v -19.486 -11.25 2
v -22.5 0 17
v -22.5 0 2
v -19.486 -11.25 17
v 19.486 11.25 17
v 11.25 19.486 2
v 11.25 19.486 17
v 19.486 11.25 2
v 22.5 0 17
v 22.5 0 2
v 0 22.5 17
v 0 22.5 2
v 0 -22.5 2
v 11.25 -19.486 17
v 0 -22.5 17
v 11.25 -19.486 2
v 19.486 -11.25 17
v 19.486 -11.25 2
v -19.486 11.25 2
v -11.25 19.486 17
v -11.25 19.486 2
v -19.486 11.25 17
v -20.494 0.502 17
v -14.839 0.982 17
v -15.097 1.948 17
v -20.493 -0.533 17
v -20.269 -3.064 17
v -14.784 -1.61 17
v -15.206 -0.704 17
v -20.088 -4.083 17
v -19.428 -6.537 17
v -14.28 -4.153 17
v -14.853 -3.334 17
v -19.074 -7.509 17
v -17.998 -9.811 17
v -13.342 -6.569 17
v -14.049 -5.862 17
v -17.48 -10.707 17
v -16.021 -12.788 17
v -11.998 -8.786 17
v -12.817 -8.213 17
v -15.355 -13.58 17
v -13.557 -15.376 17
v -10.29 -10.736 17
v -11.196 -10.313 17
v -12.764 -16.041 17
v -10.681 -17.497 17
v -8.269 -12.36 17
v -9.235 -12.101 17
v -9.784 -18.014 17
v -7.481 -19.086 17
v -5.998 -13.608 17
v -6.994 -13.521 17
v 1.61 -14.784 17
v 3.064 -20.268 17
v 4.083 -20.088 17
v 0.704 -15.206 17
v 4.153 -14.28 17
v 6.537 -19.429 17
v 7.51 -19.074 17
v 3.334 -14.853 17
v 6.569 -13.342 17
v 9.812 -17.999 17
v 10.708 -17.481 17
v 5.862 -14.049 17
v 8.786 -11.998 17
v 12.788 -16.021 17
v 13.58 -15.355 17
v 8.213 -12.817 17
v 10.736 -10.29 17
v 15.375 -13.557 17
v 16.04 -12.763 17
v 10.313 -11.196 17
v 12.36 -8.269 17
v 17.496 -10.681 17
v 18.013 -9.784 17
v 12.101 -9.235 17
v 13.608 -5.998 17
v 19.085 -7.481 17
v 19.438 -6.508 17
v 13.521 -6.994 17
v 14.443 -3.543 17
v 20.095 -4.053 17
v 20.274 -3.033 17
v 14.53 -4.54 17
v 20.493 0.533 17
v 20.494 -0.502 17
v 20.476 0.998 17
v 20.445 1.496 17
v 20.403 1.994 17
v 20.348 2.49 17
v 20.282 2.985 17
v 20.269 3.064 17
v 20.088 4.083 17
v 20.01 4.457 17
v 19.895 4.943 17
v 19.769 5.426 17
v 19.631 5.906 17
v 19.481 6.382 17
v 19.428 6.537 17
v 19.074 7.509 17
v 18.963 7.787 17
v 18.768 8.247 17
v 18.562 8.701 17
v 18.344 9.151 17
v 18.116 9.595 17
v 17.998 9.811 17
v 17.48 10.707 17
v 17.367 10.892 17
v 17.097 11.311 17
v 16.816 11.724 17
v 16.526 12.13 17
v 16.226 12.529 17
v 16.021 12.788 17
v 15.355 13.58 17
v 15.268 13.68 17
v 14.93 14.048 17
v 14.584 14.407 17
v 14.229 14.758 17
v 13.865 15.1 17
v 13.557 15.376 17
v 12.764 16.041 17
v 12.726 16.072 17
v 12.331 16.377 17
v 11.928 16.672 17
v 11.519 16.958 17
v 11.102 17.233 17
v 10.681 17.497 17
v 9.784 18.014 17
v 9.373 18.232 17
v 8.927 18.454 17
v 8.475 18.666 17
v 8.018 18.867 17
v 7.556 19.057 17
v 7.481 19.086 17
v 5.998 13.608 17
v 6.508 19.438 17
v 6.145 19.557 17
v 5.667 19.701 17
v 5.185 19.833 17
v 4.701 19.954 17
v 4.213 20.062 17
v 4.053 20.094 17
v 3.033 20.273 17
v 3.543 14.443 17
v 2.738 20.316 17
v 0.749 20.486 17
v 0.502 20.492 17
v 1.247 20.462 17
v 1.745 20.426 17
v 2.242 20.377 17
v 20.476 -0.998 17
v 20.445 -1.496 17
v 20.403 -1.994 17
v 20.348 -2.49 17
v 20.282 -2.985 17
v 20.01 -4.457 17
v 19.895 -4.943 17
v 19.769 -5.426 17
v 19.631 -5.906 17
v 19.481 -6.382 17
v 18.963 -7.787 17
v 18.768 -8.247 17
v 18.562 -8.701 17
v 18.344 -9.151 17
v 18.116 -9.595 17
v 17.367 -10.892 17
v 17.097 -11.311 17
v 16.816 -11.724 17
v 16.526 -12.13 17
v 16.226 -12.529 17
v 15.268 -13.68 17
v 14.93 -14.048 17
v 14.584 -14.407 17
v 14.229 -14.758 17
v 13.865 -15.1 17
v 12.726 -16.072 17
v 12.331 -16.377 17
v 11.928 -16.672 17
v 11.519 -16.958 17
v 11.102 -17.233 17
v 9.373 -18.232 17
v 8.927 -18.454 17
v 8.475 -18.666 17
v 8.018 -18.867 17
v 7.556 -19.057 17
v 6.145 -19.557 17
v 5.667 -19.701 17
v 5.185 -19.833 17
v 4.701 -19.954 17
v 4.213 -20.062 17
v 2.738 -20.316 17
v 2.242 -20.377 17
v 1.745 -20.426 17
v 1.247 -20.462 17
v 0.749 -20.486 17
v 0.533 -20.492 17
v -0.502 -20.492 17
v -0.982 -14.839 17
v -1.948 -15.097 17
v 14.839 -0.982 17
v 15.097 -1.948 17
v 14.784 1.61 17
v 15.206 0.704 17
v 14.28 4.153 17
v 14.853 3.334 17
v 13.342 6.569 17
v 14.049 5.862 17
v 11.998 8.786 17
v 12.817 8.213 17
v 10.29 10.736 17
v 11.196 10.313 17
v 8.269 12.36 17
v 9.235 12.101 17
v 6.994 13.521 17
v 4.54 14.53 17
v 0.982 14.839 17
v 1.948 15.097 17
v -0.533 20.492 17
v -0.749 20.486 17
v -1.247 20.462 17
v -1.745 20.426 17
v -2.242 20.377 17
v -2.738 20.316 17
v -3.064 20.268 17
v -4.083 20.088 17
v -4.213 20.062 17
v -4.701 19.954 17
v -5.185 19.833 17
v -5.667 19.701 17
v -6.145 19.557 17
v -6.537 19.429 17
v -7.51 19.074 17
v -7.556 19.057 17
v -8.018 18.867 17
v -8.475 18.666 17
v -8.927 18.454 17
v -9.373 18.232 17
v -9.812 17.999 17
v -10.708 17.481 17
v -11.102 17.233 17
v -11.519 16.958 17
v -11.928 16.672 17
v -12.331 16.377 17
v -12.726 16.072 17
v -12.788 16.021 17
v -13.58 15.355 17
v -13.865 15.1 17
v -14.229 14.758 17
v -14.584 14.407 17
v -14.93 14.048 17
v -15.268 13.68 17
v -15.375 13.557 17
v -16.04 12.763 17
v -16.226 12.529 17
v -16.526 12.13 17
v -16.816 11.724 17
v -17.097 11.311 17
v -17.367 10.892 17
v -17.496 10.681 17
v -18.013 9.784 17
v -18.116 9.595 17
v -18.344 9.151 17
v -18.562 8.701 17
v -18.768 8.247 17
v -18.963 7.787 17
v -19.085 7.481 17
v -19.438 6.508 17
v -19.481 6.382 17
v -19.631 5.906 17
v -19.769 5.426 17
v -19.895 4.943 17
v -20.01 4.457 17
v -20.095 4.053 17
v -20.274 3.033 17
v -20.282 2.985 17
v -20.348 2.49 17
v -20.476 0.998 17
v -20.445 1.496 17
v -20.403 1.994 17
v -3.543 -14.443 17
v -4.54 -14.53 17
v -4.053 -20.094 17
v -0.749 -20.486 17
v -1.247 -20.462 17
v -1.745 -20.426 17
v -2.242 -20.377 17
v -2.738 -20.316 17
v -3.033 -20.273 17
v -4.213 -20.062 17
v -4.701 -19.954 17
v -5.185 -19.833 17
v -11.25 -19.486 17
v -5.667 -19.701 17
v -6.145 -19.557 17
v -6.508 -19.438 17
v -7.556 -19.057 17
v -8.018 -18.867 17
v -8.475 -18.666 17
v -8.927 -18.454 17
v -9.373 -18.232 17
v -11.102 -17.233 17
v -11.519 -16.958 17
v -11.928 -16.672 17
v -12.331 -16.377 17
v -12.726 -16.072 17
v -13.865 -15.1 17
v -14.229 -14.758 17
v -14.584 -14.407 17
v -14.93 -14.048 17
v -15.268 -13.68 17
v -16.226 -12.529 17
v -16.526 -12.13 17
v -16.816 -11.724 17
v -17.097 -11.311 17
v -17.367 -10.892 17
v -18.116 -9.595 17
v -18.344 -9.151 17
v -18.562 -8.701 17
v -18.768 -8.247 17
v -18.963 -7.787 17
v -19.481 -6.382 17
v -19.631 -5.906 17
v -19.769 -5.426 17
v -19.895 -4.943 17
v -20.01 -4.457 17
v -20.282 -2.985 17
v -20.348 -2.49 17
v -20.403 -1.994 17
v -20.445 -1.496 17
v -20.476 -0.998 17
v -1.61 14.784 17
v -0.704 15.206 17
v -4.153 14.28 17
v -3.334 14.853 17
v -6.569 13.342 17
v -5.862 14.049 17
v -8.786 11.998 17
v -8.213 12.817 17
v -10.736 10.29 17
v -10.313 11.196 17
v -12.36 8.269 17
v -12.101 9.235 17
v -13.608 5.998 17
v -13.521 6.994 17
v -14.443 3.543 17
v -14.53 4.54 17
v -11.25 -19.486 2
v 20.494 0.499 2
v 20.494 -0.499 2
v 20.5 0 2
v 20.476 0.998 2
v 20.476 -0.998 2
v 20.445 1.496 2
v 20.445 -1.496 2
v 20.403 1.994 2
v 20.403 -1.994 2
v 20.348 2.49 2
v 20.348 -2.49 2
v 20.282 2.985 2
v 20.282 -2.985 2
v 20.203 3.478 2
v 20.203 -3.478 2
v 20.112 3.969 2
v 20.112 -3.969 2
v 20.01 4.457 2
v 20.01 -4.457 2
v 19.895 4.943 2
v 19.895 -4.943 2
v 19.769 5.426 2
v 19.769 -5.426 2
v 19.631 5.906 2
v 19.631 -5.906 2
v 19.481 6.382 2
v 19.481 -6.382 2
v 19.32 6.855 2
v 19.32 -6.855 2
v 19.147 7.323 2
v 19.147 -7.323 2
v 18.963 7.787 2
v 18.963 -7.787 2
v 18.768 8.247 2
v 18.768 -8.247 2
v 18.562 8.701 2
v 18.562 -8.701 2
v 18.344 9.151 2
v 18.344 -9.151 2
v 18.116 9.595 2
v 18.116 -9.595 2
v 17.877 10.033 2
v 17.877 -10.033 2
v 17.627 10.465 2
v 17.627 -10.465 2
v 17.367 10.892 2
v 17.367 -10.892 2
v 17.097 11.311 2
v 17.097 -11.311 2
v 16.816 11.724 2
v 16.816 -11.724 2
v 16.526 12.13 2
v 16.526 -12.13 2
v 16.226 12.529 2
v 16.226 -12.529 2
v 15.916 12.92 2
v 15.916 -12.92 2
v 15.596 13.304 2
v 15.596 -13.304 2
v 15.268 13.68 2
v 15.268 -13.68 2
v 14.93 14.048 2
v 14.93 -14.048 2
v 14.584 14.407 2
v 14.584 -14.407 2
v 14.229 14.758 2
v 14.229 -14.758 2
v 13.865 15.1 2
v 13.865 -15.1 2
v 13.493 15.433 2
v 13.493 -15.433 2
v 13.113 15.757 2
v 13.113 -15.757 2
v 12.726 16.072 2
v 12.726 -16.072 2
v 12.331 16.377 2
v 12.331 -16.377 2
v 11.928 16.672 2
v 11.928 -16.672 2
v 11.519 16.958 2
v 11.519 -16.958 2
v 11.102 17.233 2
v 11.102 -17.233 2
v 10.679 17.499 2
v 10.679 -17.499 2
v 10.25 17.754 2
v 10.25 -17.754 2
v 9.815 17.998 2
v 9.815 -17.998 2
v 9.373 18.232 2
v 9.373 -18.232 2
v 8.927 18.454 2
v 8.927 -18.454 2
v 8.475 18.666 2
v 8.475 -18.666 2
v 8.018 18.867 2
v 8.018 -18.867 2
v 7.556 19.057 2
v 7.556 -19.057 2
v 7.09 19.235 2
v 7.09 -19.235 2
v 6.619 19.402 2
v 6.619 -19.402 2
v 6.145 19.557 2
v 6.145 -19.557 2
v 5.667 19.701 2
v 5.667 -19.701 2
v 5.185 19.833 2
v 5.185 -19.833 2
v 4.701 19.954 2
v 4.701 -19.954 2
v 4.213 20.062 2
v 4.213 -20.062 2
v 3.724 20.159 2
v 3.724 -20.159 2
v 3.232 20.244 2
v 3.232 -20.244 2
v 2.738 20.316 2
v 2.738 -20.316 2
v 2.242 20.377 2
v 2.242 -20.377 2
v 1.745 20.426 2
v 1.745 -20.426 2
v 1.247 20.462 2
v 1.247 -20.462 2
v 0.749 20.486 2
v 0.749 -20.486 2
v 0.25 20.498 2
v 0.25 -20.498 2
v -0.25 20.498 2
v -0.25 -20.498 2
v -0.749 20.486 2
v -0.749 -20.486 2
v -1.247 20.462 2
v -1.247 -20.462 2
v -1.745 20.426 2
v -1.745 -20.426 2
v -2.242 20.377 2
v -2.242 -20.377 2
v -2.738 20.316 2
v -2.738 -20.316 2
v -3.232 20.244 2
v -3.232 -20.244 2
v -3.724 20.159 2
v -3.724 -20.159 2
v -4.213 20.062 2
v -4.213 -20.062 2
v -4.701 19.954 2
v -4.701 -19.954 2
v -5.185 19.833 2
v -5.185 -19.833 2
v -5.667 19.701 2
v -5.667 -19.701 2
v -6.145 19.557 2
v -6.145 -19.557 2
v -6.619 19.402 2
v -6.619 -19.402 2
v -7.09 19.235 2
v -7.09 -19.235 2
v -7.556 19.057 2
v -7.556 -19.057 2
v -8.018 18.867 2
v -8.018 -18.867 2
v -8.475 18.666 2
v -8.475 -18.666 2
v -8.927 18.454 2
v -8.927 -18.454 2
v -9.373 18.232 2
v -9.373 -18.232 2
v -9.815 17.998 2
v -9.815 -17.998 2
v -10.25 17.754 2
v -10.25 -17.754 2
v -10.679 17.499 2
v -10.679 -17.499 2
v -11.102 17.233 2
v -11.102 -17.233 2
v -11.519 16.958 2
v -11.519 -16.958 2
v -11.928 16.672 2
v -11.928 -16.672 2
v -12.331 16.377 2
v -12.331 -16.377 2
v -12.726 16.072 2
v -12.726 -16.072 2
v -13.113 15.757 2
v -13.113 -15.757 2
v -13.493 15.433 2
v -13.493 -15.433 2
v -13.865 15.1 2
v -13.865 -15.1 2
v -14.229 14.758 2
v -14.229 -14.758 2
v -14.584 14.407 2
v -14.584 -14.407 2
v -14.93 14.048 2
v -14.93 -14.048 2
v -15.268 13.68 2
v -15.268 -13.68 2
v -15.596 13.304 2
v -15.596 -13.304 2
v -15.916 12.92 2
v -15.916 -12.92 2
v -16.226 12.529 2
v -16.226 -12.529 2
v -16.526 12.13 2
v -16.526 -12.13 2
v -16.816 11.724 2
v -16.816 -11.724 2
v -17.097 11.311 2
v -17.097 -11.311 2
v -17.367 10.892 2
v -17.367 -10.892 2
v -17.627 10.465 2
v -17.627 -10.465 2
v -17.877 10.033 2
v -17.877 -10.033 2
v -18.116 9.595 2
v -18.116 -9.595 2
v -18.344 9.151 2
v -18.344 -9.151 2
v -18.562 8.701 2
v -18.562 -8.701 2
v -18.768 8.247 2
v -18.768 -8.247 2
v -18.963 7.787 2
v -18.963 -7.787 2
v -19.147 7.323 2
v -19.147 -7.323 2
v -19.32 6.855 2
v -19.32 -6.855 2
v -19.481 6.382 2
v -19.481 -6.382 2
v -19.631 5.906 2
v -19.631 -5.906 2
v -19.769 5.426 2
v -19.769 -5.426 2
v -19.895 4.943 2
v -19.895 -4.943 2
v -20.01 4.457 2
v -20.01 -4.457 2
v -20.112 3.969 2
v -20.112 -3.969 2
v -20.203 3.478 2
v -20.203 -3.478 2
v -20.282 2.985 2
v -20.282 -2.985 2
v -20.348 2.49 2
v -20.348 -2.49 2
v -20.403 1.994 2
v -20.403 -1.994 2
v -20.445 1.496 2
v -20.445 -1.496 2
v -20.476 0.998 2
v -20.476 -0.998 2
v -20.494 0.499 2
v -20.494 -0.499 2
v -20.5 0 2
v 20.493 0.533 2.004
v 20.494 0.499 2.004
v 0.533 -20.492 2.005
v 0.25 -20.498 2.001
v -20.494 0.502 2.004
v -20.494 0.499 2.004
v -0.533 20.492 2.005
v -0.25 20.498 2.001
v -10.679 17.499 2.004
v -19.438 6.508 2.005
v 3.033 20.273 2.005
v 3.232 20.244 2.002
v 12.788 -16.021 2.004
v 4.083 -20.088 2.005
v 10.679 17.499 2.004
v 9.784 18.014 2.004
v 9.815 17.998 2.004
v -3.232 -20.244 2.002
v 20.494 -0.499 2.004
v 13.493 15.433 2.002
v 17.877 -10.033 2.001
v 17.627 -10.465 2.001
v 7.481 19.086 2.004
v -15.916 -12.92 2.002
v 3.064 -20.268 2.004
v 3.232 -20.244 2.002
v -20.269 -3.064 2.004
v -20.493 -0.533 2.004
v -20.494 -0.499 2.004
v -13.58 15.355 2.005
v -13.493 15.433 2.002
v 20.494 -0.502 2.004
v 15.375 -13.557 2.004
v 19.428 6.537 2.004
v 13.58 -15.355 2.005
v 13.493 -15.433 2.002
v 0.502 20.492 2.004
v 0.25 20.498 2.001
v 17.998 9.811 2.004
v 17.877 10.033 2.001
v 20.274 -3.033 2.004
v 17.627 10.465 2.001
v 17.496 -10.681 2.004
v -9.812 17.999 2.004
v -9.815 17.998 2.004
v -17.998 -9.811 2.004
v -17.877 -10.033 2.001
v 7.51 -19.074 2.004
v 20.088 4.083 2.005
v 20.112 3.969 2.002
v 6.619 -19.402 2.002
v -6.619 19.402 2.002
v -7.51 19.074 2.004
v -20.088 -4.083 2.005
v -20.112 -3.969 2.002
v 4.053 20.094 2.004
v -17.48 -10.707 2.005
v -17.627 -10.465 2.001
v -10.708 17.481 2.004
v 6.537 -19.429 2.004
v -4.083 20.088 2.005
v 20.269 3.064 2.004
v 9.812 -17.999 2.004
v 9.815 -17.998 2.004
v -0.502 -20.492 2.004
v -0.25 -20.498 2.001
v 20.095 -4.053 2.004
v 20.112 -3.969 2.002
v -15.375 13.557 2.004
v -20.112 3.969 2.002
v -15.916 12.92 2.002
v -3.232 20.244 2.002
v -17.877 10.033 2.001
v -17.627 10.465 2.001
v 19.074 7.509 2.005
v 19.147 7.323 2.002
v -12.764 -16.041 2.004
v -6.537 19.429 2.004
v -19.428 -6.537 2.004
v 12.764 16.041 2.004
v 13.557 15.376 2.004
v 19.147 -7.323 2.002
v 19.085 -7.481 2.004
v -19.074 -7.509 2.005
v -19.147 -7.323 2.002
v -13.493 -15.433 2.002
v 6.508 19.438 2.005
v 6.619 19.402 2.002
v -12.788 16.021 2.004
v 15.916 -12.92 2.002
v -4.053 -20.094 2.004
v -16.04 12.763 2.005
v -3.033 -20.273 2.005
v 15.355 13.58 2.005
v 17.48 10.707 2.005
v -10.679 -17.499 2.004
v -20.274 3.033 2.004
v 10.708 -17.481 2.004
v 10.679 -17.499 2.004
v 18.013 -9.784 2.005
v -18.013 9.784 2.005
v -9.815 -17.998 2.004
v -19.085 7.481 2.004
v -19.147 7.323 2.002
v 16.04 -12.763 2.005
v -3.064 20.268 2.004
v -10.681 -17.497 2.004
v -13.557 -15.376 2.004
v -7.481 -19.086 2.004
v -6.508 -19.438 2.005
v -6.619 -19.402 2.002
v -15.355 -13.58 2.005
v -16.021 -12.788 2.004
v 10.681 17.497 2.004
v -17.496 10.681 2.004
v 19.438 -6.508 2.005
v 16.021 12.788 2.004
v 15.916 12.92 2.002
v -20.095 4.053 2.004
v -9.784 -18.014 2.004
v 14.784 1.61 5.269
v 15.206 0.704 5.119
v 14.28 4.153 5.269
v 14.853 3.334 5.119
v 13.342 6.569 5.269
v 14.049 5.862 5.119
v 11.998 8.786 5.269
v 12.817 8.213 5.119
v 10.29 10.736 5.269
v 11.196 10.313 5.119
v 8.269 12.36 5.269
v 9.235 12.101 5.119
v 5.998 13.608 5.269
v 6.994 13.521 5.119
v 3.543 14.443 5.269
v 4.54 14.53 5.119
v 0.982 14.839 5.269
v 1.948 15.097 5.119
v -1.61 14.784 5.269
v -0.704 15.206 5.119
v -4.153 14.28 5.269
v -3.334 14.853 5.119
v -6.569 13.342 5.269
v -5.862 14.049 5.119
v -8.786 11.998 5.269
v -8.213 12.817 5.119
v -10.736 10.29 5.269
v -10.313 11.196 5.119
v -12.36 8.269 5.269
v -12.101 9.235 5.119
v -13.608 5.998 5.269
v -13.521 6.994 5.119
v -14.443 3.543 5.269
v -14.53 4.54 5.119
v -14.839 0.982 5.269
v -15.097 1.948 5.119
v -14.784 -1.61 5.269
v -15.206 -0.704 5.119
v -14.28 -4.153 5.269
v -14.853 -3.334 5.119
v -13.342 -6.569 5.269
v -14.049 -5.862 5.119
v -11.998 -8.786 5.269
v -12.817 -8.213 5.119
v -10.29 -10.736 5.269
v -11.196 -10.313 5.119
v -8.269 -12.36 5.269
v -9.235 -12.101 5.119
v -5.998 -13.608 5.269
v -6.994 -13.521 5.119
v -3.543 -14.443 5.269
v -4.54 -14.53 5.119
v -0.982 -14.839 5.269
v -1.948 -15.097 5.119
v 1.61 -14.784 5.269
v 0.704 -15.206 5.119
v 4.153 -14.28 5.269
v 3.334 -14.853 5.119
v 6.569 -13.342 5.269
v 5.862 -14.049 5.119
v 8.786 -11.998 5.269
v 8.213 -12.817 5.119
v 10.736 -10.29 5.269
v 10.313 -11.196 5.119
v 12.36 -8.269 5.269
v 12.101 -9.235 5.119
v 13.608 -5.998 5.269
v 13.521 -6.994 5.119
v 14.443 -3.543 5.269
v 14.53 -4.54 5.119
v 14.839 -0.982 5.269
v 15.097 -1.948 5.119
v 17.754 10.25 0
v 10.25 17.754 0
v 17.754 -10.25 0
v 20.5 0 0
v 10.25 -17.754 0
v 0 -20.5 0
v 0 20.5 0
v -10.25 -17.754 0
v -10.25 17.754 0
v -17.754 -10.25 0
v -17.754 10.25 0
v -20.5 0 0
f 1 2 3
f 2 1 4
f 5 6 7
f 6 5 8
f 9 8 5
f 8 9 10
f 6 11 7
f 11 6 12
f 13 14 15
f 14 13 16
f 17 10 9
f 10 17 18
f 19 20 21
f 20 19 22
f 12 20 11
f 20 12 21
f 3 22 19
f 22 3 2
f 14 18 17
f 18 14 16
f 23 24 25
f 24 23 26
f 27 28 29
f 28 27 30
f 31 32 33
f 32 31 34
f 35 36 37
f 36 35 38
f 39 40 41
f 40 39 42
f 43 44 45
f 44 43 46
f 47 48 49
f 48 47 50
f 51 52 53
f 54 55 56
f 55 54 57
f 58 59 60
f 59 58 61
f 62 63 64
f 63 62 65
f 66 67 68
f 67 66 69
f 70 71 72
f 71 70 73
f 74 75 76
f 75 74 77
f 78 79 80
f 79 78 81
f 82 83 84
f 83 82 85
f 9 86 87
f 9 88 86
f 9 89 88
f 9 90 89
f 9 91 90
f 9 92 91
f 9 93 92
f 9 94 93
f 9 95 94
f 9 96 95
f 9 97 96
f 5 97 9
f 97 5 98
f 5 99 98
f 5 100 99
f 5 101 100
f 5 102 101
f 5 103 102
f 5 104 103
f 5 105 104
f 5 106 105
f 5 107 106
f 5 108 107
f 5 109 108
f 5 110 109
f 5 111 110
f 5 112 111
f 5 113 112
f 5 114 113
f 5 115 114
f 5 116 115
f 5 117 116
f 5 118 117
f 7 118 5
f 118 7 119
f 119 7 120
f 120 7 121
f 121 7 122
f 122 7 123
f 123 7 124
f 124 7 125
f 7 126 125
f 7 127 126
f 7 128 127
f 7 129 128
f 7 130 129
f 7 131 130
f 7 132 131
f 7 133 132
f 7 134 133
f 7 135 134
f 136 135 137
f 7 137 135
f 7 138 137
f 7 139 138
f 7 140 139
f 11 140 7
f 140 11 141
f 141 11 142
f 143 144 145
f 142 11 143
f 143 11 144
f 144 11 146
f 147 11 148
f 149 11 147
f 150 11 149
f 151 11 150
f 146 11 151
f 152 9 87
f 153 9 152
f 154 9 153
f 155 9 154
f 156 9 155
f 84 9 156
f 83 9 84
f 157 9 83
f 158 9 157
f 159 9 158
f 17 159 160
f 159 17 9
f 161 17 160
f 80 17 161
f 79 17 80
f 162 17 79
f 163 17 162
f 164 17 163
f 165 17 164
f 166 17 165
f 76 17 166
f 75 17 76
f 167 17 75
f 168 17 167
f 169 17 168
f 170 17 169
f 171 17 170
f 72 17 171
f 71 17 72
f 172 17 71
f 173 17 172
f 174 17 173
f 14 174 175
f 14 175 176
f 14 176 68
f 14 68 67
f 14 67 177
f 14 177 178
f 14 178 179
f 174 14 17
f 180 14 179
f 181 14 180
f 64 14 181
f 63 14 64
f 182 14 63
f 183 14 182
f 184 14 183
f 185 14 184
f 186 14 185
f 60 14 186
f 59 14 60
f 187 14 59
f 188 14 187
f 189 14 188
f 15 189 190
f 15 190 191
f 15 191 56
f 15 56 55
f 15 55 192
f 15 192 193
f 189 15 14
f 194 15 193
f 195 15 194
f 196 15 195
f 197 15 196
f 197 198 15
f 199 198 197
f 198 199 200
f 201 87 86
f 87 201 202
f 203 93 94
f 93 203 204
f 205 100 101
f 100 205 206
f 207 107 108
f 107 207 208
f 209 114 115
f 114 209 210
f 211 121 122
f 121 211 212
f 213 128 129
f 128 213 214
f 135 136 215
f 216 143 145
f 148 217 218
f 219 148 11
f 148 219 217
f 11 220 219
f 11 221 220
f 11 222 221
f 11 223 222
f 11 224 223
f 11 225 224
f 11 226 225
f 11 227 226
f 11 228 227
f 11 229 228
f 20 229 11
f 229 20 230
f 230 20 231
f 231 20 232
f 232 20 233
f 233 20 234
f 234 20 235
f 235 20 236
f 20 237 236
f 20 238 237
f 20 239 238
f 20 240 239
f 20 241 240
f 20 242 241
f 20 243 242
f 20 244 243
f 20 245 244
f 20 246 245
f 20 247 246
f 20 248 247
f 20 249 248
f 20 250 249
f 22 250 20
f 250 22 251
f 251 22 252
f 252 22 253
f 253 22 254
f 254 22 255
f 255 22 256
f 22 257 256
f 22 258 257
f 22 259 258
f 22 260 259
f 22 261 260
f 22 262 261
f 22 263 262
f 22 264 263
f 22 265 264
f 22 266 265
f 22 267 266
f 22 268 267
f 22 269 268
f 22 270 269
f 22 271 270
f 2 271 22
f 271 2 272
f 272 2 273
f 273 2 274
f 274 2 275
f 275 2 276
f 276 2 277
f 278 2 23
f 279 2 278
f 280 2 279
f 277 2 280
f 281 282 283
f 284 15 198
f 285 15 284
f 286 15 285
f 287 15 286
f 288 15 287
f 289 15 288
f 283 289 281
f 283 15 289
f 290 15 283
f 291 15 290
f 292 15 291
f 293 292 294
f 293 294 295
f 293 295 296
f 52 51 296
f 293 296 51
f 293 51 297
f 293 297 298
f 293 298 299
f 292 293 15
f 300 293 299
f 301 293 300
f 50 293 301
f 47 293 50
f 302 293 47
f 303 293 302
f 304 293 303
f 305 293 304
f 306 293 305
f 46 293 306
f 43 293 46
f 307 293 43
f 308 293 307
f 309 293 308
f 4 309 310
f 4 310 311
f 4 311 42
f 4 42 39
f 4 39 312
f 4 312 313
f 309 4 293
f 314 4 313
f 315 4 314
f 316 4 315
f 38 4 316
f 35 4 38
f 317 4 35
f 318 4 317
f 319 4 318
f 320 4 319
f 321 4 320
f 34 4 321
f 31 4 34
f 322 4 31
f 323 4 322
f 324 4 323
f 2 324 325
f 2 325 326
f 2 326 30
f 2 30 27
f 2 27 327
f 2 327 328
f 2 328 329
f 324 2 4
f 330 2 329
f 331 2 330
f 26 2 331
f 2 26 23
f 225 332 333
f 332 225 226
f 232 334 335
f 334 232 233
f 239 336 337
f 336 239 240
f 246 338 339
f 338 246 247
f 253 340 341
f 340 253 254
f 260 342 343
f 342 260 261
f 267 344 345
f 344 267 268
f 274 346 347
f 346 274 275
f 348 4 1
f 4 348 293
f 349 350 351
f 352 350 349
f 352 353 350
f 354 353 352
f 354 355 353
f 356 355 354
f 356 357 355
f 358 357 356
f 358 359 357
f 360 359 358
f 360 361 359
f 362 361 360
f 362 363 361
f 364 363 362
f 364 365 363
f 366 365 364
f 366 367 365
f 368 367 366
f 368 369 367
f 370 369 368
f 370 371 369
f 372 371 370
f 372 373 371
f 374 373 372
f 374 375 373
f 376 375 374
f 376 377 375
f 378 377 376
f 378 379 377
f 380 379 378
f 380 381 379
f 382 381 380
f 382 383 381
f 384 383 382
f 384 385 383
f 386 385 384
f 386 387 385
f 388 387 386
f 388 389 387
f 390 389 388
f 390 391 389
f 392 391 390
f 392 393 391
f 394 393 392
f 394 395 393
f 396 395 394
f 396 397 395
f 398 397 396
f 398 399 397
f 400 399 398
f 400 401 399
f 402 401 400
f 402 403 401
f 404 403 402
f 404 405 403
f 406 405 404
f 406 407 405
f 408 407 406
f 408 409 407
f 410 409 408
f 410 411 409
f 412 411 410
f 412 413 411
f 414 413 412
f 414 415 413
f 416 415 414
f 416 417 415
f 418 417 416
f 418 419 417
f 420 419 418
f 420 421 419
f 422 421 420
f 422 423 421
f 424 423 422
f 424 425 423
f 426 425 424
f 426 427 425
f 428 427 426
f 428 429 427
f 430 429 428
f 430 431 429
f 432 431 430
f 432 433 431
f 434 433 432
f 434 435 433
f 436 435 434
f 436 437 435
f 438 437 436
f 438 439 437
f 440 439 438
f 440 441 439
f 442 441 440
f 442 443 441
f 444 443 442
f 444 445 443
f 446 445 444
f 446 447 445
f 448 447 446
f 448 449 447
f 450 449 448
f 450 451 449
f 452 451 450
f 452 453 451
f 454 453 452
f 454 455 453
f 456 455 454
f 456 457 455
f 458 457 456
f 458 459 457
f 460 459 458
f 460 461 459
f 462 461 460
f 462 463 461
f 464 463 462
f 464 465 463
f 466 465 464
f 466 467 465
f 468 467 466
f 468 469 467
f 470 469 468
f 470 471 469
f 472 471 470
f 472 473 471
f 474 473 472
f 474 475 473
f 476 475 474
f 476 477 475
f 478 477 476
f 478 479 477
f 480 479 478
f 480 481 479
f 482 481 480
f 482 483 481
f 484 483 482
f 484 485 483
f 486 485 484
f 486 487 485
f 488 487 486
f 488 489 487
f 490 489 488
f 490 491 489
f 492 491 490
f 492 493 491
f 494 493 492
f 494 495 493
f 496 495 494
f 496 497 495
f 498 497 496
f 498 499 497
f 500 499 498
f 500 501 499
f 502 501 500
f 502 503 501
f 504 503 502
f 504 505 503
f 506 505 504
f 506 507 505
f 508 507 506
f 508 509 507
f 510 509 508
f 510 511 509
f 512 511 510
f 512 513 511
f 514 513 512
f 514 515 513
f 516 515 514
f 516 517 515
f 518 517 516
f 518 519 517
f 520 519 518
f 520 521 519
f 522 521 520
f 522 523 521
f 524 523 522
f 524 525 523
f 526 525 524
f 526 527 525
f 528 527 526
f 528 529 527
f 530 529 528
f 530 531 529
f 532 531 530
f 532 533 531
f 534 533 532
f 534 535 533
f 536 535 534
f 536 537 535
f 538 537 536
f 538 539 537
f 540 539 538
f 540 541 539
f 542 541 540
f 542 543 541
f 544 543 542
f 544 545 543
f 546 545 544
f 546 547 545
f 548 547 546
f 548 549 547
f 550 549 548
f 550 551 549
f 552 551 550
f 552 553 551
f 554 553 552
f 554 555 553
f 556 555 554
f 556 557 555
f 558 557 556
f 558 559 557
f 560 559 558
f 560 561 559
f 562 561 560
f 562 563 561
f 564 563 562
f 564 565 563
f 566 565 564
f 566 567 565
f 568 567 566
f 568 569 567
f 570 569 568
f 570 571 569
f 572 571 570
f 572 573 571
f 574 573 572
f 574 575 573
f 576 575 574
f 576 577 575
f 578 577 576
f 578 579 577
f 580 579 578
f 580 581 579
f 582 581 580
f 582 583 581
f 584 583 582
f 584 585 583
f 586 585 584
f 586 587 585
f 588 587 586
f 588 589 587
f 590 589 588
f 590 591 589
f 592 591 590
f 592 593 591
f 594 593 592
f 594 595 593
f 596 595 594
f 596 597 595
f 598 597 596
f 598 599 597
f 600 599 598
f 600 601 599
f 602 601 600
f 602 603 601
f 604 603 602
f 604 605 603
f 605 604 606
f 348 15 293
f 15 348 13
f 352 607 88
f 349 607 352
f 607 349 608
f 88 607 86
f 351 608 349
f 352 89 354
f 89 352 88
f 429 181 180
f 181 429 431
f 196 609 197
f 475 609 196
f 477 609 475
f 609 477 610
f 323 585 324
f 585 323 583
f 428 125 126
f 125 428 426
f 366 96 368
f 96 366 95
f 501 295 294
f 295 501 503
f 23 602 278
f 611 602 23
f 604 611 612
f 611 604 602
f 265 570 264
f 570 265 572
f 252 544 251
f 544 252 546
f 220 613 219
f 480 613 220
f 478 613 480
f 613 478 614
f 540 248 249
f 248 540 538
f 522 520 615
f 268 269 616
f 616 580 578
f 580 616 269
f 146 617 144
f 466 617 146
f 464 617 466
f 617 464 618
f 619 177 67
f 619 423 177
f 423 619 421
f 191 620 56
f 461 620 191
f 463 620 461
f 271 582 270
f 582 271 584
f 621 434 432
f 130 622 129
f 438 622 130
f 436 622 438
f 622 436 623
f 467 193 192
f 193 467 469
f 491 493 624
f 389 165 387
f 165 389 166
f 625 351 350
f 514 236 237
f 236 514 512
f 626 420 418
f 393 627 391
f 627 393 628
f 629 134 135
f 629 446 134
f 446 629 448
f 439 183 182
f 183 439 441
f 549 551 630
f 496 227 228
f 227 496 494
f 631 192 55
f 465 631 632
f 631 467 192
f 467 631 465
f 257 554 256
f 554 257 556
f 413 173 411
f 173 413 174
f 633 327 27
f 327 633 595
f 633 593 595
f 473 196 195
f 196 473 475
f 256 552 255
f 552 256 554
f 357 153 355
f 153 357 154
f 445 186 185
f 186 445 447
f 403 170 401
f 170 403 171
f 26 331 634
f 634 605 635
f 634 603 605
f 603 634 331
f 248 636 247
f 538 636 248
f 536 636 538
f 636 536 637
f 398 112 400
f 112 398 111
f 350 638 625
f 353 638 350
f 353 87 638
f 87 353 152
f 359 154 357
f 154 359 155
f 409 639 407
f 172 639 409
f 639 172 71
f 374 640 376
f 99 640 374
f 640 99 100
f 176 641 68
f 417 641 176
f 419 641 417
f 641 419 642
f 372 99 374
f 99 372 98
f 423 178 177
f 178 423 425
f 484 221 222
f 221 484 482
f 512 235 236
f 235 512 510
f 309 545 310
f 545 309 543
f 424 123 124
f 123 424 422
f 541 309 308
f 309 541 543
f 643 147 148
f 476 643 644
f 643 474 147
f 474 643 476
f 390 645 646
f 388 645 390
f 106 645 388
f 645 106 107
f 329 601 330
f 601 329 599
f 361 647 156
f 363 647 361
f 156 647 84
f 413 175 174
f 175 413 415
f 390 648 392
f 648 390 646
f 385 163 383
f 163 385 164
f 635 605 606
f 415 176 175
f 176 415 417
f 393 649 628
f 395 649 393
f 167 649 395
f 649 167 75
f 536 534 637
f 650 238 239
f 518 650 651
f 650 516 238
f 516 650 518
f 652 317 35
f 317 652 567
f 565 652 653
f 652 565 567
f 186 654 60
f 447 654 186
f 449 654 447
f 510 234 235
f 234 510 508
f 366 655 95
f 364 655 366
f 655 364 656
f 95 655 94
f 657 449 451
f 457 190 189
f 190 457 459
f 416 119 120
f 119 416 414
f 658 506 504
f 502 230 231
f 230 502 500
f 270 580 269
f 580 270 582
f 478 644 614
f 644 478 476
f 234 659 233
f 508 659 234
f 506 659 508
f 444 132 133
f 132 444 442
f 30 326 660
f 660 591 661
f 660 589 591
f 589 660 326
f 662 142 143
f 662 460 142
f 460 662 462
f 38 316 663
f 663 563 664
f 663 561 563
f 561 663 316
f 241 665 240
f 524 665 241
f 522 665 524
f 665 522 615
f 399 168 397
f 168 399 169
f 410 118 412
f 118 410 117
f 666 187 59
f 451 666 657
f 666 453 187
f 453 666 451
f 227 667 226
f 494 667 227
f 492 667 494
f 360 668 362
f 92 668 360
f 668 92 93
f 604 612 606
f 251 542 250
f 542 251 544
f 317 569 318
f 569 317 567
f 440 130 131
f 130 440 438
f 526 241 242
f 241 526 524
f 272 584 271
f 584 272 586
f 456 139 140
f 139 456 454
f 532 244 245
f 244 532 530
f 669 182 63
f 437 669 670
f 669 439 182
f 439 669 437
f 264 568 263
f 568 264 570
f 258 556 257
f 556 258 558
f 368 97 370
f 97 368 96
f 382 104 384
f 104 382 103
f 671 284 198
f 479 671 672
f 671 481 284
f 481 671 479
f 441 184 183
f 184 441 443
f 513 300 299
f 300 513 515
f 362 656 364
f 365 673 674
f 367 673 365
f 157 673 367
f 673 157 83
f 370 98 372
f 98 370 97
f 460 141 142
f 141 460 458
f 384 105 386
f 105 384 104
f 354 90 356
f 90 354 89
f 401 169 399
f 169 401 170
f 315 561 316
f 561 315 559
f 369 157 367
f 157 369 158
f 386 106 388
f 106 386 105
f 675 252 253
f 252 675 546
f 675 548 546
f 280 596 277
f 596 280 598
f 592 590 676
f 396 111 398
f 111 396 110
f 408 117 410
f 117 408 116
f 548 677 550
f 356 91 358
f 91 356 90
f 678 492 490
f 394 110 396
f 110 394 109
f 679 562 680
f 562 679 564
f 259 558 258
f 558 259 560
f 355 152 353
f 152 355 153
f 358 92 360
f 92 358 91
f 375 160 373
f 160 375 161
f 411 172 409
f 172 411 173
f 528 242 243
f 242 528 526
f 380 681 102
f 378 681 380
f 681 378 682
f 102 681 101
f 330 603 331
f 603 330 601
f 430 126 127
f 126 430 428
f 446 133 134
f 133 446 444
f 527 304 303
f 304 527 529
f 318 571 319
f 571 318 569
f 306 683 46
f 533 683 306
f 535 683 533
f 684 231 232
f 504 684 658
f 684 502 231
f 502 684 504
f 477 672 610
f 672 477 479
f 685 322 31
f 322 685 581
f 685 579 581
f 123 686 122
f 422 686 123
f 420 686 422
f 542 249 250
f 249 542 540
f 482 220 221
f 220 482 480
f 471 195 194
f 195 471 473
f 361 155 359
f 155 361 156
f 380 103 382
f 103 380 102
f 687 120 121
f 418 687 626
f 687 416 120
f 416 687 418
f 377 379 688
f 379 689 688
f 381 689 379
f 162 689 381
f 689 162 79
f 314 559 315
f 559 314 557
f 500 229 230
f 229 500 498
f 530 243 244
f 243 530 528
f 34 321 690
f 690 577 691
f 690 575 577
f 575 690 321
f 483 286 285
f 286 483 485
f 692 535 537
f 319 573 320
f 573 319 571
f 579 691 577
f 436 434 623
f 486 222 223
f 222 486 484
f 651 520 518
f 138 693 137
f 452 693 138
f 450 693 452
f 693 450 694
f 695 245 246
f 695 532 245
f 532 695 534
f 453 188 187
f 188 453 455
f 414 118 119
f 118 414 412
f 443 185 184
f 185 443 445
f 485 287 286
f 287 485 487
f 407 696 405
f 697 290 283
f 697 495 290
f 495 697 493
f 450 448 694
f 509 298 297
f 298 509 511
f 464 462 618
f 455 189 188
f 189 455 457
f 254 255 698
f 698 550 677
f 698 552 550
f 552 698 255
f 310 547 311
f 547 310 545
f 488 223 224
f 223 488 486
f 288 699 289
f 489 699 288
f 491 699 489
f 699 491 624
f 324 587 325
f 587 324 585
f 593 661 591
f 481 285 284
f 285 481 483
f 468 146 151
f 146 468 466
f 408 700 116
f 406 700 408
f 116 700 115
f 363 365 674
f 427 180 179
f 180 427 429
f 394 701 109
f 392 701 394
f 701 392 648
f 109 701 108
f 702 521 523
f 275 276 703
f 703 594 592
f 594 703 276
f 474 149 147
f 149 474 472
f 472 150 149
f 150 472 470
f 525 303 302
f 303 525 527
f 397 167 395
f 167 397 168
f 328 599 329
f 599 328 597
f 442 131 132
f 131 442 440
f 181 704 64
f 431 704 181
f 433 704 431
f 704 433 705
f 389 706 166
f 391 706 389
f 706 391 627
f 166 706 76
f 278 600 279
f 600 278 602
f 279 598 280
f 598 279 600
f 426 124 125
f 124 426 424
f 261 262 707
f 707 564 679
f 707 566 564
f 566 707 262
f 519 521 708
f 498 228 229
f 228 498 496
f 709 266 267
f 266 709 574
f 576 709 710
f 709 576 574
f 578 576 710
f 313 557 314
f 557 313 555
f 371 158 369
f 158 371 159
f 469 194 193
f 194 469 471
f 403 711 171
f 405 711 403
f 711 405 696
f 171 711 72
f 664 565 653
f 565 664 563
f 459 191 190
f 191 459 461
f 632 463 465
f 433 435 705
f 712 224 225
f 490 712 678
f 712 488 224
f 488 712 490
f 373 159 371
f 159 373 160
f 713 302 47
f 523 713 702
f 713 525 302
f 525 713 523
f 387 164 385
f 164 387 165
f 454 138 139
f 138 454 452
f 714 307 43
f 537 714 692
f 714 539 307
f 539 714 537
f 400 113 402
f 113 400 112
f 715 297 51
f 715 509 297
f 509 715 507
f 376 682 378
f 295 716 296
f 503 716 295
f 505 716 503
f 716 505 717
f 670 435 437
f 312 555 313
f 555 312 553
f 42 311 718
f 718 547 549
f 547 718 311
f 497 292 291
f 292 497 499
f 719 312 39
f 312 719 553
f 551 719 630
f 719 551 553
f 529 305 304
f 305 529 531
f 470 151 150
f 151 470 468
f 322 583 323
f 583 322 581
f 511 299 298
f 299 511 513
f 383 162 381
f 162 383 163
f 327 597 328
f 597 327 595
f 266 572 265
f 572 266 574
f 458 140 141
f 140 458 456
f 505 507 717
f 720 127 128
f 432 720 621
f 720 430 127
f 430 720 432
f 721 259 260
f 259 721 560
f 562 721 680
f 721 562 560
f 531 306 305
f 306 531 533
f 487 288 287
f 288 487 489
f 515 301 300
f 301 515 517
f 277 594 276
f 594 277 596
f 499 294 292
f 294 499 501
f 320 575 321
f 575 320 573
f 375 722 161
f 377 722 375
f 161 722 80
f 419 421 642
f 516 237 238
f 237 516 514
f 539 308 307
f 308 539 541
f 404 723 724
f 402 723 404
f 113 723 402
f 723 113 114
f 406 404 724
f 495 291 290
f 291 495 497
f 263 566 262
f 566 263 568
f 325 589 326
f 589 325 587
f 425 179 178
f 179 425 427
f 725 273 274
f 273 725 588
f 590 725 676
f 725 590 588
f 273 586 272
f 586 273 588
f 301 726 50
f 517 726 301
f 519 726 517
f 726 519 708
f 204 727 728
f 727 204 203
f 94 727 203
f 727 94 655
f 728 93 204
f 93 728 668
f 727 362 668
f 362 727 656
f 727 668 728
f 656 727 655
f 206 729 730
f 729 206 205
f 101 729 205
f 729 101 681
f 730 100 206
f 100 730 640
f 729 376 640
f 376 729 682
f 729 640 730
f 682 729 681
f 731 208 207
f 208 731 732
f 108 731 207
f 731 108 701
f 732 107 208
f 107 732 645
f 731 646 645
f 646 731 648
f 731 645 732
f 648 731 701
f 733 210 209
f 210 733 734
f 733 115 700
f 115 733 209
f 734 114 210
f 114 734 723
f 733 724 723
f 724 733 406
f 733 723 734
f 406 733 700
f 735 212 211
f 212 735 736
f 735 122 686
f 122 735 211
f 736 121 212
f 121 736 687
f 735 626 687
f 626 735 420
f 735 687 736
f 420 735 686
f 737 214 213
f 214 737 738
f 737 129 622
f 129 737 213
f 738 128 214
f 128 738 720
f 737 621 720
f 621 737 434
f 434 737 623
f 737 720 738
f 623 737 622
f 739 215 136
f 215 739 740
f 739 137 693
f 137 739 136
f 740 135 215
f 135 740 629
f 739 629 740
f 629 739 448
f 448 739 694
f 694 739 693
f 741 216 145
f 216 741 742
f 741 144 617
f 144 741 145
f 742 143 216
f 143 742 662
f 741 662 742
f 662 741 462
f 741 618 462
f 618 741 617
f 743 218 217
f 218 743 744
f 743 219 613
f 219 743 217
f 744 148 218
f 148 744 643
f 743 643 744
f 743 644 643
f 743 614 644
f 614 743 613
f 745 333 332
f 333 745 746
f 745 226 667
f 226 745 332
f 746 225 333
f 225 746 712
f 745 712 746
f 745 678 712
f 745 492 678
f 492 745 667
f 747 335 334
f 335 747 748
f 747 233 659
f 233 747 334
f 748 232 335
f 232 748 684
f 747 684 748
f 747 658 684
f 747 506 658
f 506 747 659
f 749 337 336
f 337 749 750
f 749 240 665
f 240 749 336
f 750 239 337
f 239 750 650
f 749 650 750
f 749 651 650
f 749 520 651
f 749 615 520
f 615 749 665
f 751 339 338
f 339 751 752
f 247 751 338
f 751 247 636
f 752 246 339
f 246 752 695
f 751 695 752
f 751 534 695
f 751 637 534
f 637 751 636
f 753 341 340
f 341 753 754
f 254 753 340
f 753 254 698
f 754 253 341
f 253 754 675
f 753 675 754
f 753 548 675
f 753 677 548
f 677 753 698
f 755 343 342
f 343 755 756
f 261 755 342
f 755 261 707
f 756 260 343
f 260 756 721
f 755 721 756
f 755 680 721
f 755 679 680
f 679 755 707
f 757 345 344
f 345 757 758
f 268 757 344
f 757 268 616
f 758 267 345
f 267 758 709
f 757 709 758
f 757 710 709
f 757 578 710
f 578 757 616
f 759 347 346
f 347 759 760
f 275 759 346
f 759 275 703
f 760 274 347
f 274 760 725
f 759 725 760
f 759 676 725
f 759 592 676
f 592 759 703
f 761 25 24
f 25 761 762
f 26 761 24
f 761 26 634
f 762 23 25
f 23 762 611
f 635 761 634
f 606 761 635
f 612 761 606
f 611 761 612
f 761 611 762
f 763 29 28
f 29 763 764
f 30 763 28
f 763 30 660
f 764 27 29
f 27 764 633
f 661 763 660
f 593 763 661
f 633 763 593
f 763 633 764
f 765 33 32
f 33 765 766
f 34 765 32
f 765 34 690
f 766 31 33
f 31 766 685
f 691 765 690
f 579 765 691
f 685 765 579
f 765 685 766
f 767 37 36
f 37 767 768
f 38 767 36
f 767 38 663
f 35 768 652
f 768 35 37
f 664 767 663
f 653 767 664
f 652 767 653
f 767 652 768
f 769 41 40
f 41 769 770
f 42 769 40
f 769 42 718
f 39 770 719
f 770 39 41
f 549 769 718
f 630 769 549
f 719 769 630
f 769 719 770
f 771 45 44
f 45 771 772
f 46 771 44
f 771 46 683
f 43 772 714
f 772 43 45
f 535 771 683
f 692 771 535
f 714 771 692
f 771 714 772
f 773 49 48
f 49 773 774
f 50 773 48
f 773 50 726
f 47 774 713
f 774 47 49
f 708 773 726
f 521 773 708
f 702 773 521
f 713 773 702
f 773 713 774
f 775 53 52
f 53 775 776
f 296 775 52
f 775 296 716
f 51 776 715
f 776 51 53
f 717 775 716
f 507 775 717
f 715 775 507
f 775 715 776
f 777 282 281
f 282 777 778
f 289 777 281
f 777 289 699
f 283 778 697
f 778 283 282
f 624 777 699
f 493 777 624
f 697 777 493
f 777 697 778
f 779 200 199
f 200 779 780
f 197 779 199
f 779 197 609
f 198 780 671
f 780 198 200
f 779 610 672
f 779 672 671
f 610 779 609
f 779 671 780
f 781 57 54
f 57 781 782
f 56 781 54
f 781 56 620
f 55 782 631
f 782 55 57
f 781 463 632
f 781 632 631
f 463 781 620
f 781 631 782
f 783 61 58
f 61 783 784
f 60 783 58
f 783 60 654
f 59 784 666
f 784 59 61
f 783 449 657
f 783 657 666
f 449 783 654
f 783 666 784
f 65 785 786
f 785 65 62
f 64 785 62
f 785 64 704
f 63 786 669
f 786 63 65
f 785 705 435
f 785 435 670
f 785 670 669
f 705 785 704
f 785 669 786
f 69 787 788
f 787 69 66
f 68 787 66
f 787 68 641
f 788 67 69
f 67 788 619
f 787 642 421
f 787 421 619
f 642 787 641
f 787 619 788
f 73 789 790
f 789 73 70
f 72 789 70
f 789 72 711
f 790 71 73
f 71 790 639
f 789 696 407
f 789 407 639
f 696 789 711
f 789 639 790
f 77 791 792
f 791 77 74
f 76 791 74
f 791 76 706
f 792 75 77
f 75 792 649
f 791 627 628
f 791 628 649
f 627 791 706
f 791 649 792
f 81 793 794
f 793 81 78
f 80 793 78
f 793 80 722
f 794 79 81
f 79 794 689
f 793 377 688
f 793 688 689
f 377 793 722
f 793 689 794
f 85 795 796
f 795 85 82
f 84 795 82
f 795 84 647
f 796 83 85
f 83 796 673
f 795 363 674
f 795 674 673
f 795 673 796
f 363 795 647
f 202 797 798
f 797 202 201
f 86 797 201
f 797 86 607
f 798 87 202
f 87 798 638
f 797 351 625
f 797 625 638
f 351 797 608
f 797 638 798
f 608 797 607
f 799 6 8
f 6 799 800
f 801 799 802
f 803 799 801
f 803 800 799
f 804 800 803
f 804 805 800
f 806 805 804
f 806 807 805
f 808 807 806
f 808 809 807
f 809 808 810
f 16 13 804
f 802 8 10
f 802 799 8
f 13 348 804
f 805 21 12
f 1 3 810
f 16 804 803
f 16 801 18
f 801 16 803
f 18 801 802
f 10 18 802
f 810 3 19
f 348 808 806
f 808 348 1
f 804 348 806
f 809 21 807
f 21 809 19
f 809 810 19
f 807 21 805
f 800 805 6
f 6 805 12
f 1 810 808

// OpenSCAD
// [FL_INDEX: keywords="openscad, 3d_parametric, Parametric_Soda_Bottle_Gripper_Opener, csg_solid" | COT="Parametric OpenSCAD design from 3DCodeverse"]
// Title: Parametric Soda Bottle Gripper/Opener

//parametric soda bottle opener
//John Finch 12/3/13
//Added chamfer to top of cap 12/3/13


cap_dia = 30.5;
cap_height = 15;
interference = .01;  //fraction the spine protruding into cap diameter

outer_dia = 45;
inner_dia = cap_dia * (1-interference);
wall_thickness = 2;
spine_angle = 15;
spine_thickness = 1;
num_spines = 36;

spine_length = (outer_dia/2-wall_thickness-inner_dia/2)/cos(spine_angle);

fa=0.01;
fs=0.5;

module spine(){
//echo(outer_dia/2-wall_thickness-spine_length);
//echo(-spine_thickness/2);
difference(){
	translate ([outer_dia/2-wall_thickness-spine_length*cos(spine_angle),-spine_thickness/2-spine_length*sin(spine_angle),0])
	rotate([0,0,spine_angle])
	cube([spine_length+.5,spine_thickness,cap_height]);
	
	translate([outer_dia/2-wall_thickness-spine_length,spine_length/2,0])
	rotate([90,0,0])
	cylinder(h=spine_length,r1=spine_length, r2=spine_length,$fn=3);
}
}


translate([0,0,2])
difference(){
	cylinder(h = cap_height, r1 = outer_dia/2, r2 = outer_dia/2, $fn=12);
	cylinder(h = cap_height, r1 = outer_dia/2-wall_thickness, r2 = outer_dia/2-wall_thickness, $fa=fa, $fs=fs);

	}
rot_angle = 360/num_spines;
translate([0,0,2])
for ( i = [ 1 : num_spines ] )
	{
	rotate([0,0,i*rot_angle])
	spine();
	}

translate([0,0,0])
cylinder(h = 2, r1 = outer_dia/2-2, r2 = outer_dia/2, $fn=12);

//spine();
